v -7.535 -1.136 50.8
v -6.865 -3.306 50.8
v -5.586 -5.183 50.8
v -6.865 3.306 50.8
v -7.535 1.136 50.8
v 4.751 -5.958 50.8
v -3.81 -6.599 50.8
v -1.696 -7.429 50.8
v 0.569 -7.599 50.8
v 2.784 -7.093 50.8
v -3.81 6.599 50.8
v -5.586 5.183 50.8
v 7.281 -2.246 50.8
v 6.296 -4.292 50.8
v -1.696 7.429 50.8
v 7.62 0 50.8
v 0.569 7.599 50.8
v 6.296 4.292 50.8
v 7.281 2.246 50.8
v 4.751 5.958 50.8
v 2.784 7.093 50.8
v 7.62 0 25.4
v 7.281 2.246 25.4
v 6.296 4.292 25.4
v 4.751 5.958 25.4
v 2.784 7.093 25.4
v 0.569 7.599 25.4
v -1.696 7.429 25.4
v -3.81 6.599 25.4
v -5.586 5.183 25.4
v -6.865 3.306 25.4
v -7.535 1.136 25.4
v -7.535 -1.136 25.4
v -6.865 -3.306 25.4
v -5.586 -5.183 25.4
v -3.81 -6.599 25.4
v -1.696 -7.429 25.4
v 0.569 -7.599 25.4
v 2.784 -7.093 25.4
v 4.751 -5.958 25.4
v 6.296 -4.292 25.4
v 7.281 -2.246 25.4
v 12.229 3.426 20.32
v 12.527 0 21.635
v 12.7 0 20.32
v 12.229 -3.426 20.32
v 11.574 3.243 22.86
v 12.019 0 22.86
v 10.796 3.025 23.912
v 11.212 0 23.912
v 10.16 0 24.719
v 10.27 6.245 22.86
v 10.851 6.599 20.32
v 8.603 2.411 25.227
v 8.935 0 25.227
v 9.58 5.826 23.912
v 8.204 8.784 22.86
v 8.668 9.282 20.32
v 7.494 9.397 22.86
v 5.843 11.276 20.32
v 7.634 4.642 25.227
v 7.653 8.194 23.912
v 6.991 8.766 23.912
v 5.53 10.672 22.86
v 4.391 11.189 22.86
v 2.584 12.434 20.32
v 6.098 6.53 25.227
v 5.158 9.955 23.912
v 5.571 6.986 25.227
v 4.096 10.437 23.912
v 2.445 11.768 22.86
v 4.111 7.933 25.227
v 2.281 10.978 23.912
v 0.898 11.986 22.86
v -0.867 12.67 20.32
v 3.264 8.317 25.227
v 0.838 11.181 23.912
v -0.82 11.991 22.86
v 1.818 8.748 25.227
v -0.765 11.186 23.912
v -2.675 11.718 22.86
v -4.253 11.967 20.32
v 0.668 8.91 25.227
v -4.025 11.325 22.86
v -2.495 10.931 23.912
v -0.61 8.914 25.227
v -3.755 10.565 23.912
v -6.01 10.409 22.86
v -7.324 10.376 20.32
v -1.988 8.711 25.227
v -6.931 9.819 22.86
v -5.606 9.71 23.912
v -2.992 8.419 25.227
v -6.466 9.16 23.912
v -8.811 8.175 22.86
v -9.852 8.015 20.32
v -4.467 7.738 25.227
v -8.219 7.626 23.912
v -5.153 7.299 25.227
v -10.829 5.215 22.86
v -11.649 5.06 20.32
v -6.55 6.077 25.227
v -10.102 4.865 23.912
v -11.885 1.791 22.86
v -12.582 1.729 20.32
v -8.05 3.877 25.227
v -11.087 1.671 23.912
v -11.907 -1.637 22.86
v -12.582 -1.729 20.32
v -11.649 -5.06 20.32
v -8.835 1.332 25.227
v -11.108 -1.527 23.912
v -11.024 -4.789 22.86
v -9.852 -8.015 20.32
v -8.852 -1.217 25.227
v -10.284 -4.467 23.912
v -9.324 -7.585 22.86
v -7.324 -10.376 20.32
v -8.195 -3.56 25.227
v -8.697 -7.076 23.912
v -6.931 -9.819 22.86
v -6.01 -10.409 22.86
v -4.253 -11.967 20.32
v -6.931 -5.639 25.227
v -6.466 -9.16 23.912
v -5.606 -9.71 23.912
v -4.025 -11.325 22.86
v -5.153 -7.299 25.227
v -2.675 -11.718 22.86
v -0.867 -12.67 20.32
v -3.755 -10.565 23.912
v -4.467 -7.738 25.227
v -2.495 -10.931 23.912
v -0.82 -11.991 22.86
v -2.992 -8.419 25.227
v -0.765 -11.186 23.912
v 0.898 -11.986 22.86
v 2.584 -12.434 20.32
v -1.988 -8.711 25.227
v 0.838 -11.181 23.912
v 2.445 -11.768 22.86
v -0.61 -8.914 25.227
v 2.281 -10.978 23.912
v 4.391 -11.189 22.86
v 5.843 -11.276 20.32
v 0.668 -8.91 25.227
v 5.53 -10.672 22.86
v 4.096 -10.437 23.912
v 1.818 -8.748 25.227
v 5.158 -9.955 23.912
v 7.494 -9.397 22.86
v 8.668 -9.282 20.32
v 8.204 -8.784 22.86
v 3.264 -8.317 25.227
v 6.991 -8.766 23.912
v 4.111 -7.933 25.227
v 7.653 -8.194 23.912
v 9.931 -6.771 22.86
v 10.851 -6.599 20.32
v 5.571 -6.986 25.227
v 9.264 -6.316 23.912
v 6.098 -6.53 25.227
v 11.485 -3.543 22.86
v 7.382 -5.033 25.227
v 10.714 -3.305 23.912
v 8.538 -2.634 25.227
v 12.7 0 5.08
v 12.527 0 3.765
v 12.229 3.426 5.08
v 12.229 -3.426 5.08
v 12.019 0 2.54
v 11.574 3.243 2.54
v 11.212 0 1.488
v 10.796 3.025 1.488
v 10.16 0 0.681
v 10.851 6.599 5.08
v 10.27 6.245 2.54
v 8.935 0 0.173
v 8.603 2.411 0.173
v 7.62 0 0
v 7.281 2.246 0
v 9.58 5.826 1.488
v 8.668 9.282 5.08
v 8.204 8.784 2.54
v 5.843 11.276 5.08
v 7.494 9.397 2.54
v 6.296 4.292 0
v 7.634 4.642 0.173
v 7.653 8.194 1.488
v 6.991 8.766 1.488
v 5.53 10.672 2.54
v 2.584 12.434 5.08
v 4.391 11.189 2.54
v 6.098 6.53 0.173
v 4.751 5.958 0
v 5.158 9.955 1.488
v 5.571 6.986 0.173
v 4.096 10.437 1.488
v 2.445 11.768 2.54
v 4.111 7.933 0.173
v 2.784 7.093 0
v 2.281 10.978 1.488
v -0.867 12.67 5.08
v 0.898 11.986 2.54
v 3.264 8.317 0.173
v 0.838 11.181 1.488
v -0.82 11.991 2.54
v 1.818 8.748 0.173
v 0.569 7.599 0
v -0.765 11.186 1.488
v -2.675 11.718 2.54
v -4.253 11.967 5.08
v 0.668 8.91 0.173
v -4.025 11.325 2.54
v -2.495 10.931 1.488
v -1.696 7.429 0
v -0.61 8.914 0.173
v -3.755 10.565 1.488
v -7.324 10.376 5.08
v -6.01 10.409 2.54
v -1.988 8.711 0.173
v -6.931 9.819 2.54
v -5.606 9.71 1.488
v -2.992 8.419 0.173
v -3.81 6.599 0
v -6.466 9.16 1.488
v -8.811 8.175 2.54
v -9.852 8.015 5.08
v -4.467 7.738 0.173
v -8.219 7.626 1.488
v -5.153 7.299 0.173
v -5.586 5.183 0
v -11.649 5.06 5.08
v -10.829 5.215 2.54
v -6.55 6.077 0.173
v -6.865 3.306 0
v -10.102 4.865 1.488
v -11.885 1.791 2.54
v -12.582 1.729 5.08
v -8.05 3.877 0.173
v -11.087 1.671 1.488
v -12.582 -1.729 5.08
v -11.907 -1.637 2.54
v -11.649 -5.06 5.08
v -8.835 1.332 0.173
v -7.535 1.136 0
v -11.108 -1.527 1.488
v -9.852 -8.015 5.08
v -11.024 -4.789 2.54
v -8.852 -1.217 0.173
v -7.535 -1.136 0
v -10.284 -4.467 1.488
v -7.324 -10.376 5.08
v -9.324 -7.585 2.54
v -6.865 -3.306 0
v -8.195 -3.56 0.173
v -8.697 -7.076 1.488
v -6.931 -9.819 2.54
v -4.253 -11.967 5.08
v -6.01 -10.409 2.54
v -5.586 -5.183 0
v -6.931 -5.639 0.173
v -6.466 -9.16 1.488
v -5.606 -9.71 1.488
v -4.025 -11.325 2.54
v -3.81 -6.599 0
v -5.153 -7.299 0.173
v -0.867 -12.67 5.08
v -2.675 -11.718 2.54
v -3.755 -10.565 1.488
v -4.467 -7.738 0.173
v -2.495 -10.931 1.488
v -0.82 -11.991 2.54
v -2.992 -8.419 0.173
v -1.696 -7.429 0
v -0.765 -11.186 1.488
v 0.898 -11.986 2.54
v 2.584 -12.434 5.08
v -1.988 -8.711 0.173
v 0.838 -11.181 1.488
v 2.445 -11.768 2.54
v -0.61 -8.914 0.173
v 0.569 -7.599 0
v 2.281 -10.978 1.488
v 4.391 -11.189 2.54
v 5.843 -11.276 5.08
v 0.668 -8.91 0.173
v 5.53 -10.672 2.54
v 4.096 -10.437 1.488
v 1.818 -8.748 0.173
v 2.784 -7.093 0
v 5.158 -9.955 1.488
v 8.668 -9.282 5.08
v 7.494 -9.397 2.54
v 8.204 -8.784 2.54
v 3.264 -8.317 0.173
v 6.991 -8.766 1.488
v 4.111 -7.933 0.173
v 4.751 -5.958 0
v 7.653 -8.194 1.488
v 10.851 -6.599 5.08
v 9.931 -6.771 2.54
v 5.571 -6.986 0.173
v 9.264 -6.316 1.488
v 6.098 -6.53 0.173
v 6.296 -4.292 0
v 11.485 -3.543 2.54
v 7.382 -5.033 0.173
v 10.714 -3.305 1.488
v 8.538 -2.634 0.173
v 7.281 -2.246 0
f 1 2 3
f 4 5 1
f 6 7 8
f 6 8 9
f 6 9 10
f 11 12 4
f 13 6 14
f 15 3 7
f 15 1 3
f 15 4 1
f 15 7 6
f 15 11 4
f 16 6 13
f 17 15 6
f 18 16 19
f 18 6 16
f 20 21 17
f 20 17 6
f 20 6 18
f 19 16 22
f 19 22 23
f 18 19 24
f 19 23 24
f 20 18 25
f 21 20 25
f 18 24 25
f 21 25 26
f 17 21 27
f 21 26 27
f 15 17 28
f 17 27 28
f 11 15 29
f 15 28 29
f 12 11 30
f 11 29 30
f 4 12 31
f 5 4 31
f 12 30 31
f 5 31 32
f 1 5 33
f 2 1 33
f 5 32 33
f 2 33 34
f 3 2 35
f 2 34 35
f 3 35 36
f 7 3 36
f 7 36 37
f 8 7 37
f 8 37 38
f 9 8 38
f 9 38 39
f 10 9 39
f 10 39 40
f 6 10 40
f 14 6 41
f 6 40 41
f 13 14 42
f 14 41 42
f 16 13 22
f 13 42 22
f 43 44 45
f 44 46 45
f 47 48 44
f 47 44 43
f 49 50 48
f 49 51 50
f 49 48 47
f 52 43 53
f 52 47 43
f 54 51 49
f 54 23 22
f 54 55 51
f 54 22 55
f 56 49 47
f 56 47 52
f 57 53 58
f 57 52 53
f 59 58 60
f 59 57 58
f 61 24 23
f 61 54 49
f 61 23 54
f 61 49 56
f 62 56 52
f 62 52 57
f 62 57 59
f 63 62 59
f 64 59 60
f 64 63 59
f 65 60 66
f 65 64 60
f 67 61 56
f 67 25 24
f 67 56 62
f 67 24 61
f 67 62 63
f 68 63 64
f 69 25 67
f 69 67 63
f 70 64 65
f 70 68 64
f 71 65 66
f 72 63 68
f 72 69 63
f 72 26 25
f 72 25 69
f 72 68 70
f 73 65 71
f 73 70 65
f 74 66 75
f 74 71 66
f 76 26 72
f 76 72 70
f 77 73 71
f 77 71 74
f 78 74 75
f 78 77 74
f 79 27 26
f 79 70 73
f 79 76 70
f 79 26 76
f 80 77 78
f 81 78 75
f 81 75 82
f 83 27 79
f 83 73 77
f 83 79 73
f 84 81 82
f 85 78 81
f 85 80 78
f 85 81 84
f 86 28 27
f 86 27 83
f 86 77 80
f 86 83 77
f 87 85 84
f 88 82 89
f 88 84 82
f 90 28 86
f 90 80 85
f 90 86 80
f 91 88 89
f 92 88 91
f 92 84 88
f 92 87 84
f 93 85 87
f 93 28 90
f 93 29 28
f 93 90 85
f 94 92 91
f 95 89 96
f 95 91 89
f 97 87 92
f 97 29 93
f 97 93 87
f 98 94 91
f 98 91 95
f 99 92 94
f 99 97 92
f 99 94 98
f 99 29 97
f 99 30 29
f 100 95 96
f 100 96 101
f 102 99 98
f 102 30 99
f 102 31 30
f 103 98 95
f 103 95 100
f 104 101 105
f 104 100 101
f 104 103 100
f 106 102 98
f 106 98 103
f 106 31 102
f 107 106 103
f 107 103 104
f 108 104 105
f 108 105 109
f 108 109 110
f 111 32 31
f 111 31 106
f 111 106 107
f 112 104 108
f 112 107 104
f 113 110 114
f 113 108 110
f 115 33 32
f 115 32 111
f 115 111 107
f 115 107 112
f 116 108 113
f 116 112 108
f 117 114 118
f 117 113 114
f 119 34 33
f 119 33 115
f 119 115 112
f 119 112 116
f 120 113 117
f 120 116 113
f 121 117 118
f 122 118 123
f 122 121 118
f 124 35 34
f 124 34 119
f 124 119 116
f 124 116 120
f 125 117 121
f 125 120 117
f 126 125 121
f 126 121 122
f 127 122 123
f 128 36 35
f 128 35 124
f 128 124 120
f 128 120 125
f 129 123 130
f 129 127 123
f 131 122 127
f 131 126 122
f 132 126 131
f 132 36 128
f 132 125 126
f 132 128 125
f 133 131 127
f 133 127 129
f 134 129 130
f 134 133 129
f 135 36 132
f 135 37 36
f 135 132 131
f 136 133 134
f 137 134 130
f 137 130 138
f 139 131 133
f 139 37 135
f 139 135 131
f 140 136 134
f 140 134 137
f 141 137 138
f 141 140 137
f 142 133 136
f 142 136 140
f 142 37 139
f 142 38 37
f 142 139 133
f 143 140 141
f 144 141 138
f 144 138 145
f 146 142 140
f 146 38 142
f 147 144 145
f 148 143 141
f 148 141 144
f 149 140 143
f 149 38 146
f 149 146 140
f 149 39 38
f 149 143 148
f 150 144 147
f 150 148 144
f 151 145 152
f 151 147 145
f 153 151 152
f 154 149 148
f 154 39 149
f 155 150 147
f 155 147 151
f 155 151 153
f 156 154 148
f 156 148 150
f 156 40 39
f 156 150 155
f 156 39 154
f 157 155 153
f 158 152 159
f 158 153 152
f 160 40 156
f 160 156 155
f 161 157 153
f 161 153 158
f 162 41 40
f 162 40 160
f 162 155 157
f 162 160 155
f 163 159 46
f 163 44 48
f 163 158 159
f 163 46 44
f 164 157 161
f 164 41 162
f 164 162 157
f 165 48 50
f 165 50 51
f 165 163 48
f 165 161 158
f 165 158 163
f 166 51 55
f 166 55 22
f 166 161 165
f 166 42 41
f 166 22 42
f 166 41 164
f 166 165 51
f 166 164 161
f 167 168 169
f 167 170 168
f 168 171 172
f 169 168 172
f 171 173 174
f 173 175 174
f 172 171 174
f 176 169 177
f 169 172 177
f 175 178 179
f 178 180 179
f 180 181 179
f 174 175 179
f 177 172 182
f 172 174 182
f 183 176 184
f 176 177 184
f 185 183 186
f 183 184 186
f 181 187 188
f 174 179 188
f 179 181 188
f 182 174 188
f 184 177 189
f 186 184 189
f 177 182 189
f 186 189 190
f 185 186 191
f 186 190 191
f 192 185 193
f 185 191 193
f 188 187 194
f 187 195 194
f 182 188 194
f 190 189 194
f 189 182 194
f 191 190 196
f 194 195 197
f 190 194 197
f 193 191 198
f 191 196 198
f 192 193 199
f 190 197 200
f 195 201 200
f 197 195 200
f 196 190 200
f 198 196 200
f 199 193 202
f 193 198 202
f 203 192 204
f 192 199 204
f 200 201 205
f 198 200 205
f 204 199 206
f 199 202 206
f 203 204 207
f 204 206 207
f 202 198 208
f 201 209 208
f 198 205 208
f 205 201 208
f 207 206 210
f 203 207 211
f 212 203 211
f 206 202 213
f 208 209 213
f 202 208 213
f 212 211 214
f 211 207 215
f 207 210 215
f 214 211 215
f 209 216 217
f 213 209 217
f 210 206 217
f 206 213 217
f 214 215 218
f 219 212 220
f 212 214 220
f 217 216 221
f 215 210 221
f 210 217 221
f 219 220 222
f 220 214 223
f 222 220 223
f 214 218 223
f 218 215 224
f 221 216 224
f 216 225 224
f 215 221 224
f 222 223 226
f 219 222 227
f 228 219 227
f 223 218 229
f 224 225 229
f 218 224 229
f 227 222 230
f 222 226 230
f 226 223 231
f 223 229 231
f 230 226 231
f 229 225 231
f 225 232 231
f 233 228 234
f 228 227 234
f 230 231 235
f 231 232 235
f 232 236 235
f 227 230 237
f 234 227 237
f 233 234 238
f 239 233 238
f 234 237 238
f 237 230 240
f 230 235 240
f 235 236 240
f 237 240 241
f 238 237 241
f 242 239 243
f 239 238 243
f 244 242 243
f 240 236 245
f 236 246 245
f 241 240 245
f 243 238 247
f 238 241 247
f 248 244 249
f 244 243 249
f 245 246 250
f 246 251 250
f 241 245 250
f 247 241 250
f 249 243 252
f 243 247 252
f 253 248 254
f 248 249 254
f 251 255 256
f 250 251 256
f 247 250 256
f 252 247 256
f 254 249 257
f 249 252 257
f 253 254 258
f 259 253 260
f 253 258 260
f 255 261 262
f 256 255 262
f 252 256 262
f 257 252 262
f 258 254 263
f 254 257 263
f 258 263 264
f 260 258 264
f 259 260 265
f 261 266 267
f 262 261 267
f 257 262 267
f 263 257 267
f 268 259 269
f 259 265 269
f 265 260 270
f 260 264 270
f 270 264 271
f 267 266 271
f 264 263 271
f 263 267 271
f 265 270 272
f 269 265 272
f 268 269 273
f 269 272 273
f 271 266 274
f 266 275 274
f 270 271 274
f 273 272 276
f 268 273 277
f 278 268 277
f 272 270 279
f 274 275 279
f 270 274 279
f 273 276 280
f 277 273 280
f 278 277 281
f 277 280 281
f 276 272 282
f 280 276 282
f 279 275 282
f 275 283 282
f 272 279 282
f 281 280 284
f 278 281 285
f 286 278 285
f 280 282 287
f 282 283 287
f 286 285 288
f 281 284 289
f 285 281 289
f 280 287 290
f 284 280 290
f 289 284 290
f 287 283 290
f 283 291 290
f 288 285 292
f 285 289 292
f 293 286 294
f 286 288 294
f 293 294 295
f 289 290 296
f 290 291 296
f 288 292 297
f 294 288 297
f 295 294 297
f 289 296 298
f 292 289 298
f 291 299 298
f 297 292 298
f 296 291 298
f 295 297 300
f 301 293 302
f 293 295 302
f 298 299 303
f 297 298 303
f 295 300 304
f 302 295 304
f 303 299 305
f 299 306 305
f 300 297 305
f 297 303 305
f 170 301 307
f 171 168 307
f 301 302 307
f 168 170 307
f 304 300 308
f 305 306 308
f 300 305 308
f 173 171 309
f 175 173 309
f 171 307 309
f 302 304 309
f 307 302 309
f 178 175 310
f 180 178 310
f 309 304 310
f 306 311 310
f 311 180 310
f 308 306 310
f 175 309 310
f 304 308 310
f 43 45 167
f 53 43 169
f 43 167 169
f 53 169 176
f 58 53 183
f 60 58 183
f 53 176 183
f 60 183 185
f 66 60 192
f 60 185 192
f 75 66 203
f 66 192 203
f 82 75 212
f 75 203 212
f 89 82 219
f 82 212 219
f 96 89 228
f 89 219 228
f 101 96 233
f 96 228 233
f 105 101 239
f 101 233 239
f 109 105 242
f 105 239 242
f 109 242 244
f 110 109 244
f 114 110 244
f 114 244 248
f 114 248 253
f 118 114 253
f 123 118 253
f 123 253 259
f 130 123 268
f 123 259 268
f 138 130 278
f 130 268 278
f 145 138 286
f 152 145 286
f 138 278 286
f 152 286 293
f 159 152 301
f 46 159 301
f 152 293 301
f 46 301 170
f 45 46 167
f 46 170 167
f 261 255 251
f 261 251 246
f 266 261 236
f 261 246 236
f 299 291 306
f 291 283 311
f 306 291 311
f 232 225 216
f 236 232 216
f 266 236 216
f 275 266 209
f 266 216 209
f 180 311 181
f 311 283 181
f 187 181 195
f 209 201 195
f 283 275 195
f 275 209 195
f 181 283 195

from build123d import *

# Parameters (mm, degrees)
F0_R      = 12.7
F1_DEPTH  = 25.4
F2_R      = 5.08
F1_FACE_R = 7.62
F3_DEPTH  = 25.4


with BuildPart() as f1:
    # F0 (on Top) → F1 (new body)
    with BuildSketch(Plane.XY):
        Circle(F0_R)
    extrude(amount=F1_DEPTH)

    # F2
    f2_edges = [f1.edges().sort_by_distance(p)[0] for p in [
        (-12.7, 0, 25.4),
        (-12.7, 0, 0),
    ]]
    fillet(f2_edges, radius=F2_R)

    # F1_face (on face) → F3 (join)
    with BuildSketch(Plane.XY.offset(25.4)):
        Circle(F1_FACE_R)
    extrude(amount=F3_DEPTH)


solid = f1.part
